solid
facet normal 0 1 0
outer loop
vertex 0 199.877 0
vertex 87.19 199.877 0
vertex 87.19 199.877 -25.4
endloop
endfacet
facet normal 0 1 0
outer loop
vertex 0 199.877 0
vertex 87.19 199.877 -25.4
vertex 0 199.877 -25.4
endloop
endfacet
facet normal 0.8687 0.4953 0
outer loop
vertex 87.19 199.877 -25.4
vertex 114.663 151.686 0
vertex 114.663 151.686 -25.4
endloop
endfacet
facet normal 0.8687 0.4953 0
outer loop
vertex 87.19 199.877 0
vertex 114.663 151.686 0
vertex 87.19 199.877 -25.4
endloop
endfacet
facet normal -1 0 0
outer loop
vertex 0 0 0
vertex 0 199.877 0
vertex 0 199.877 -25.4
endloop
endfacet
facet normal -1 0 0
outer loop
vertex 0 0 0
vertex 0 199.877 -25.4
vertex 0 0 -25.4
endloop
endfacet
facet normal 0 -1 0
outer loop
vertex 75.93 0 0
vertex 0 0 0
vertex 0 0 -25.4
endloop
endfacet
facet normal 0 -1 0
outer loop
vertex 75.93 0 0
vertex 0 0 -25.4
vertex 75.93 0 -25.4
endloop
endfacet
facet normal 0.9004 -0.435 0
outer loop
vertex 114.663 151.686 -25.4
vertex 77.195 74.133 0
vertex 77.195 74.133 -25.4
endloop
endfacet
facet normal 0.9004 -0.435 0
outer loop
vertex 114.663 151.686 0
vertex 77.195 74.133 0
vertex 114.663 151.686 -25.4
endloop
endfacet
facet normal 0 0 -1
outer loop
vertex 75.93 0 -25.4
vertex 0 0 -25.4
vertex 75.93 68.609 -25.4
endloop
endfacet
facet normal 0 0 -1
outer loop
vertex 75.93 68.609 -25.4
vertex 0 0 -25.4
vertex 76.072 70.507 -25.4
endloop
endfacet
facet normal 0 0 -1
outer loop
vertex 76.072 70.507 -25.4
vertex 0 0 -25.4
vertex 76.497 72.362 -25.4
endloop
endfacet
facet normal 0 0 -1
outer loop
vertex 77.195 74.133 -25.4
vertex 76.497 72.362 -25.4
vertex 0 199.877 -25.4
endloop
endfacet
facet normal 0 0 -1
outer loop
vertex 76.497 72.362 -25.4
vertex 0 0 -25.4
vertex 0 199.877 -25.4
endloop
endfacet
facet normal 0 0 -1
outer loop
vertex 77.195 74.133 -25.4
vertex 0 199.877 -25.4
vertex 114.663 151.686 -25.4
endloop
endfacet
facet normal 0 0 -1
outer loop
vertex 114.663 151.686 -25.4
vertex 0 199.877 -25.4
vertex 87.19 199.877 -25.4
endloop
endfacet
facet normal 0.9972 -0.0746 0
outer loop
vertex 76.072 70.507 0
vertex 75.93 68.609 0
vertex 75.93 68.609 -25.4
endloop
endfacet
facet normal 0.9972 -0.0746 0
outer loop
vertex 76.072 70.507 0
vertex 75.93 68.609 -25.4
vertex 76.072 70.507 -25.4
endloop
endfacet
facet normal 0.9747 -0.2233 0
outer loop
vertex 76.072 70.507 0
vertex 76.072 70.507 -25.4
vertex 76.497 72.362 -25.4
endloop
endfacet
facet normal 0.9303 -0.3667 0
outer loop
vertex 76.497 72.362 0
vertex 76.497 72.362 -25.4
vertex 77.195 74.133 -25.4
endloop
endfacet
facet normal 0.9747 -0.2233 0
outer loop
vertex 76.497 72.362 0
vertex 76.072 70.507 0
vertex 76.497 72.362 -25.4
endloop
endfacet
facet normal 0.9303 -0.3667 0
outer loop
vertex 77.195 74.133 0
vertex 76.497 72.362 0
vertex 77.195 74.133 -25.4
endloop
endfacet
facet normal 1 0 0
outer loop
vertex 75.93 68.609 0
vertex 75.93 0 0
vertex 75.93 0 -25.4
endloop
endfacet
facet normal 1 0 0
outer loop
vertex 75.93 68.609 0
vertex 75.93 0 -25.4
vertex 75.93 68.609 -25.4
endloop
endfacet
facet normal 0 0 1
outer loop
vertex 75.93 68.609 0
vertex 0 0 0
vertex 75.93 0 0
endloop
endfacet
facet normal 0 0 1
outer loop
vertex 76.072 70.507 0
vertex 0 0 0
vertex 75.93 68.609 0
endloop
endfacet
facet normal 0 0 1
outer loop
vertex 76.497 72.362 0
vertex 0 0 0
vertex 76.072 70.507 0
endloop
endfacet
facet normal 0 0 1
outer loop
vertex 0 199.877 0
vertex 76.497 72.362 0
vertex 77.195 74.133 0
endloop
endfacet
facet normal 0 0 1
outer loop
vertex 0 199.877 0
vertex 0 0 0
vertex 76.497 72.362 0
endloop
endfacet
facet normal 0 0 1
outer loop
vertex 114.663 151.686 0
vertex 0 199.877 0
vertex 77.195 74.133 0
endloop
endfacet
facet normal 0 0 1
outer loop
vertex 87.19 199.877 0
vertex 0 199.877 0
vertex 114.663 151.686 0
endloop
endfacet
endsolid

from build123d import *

# Parameters (mm, degrees)
EXTRUDE1_DEPTH = 25.4


with BuildPart() as part:
    # Sketch2 → Extrude1 (new body)
    with BuildSketch(Plane.XY):
        with BuildLine():
            Line((0, 0), (75.929788313, 0))
            Line((75.929788313, 0), (75.929788313, 68.608572188))
            ThreePointArc((75.929788313, 68.608572188), (76.25000769, 71.442479692), (77.194517721, 74.133478204))
            Line((77.194517721, 74.133478204), (114.663486186, 151.685529213))
            Line((114.663486186, 151.685529213), (87.189584206, 199.877455637))
            Line((87.189584206, 199.877455637), (0, 199.877455637))
            Line((0, 199.877455637), (0, 0))
        make_face()
    extrude(amount=-EXTRUDE1_DEPTH)


solid = part.part
